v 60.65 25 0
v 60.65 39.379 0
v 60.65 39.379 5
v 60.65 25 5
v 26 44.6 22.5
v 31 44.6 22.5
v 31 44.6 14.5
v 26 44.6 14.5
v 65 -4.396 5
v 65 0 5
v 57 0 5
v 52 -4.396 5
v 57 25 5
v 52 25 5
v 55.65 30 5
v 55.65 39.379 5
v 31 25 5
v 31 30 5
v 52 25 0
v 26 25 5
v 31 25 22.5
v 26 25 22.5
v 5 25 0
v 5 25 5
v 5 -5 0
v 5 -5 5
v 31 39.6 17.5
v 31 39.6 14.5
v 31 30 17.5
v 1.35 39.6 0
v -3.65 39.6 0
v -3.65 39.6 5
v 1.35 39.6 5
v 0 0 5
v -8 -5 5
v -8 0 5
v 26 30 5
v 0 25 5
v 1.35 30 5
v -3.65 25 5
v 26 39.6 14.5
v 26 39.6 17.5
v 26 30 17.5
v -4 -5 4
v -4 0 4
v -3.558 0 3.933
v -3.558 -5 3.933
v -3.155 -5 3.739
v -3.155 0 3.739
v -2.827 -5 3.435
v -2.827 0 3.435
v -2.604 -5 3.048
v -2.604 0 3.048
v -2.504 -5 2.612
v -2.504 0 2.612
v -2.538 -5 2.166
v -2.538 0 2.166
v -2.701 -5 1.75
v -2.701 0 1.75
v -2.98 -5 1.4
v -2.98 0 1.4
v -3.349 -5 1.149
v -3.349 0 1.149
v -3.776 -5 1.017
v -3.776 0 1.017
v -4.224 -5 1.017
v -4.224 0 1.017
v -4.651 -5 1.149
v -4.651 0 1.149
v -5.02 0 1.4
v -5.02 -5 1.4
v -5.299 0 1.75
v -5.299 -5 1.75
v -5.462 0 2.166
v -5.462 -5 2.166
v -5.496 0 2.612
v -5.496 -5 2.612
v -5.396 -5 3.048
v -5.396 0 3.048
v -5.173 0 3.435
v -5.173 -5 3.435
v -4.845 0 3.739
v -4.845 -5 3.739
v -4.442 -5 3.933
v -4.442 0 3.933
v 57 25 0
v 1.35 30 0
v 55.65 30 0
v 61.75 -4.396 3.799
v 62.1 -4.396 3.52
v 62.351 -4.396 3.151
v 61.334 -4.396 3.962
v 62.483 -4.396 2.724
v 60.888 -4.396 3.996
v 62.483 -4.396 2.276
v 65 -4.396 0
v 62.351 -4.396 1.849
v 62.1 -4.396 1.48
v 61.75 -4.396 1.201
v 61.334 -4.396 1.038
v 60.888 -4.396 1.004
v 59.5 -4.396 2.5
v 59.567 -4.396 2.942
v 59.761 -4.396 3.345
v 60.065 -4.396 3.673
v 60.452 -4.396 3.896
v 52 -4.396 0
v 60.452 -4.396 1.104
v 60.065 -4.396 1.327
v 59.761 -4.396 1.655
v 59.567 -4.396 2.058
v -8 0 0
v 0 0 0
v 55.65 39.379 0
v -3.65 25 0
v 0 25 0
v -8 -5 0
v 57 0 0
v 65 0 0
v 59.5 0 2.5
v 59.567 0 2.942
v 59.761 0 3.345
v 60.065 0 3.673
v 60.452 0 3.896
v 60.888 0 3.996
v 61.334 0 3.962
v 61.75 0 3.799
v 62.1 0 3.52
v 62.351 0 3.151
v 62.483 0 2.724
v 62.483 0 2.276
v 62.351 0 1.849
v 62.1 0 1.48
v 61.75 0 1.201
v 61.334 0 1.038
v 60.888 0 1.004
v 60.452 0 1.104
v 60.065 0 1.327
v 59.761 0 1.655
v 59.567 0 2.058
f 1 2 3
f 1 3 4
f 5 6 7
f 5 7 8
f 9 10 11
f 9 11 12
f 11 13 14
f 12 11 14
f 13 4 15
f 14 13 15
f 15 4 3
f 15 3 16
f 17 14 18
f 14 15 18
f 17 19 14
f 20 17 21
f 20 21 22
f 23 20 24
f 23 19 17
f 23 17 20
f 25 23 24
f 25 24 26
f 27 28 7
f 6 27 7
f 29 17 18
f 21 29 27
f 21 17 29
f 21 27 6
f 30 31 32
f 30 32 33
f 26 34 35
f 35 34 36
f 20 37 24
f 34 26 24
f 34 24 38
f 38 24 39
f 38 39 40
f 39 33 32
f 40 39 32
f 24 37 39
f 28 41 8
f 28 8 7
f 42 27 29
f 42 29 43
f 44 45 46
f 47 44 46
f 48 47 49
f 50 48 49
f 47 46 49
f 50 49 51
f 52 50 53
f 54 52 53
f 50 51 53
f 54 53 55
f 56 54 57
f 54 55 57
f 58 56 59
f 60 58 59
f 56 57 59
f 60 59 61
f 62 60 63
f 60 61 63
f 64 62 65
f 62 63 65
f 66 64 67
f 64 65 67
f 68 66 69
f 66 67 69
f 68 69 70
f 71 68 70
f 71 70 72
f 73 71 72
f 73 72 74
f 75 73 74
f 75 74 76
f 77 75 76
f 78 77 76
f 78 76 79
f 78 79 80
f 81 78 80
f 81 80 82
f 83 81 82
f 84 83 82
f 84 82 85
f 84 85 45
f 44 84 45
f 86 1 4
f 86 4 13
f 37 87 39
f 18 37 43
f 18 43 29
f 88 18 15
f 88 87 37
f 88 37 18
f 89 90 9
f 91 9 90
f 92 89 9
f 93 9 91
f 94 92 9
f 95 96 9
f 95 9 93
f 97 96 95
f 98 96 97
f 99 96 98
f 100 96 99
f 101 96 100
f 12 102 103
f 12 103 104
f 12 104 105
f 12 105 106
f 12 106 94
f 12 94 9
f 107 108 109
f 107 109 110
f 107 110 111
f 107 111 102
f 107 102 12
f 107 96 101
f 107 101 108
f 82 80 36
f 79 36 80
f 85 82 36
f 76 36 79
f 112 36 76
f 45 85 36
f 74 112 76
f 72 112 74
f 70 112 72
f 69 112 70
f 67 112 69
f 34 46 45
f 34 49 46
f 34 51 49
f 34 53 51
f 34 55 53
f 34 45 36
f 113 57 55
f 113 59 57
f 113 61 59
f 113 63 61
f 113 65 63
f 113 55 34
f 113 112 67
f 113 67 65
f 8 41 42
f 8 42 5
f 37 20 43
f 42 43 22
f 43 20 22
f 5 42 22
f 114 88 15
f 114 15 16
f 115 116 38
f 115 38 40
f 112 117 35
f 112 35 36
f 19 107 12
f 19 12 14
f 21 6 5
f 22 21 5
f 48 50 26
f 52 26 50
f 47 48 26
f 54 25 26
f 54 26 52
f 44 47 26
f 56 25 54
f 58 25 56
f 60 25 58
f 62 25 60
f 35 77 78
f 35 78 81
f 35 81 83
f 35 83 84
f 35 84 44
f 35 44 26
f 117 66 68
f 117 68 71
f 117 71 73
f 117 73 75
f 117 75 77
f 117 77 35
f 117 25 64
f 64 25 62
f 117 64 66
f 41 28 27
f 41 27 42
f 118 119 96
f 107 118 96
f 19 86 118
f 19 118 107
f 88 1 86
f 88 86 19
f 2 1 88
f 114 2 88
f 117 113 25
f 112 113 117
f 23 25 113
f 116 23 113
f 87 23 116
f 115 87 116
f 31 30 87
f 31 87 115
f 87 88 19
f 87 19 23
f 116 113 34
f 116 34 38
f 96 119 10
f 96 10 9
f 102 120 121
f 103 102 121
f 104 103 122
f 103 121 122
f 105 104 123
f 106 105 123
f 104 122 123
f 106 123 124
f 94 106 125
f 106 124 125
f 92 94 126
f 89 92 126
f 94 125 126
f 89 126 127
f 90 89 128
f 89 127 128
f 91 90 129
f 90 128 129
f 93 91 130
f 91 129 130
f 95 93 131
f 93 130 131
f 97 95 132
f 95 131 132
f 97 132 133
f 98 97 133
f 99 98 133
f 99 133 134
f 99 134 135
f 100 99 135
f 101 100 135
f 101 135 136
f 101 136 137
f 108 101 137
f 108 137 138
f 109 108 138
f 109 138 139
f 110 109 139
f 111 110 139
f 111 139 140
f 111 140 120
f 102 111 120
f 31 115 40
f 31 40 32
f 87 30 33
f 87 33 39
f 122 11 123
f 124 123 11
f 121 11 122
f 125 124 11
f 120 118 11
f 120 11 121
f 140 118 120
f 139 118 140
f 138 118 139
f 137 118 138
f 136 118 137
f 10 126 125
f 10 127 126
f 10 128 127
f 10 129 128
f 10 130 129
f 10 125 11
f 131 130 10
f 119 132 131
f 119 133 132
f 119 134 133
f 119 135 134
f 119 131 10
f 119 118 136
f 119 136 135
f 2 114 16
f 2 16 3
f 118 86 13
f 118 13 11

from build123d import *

# Parameters (mm, degrees)
BOSS_EXTRUDE1_DEPTH = 5
SKETCH2_R           = 1.5
CUT_EXTRUDE1_DEPTH  = 41.708230126
SKETCH3_W           = 5
SKETCH3_H           = 5
BOSS_EXTRUDE2_DEPTH = 47
BOSS_EXTRUDE3_DEPTH = 5
SKETCH5_R           = 1.5
CUT_EXTRUDE2_DEPTH  = 77.27686412
BOSS_EXTRUDE4_DEPTH = 12.5
SKETCH10_W          = 5
SKETCH10_H          = 5
BOSS_EXTRUDE5_DEPTH = 14.6
BOSS_EXTRUDE6_DEPTH = 5


with BuildPart() as part:
    # Sketch1 → Boss-Extrude1 (new body)
    with BuildSketch(Plane.XY):
        Polygon((0, 0), (0, 25), (-3.65, 25), (-3.65, 39.6), (1.35, 39.6), (1.35, 30), (5, 30), (5, -5), (-8, -5), (-8, 0), align=None)
    extrude(amount=BOSS_EXTRUDE1_DEPTH)

    # Sketch2 → Cut-Extrude1 (cut, through all)
    with BuildSketch(Plane(origin=(0, 0, 0), x_dir=(1, 0, 0), z_dir=(0, 1, 0))):
        with Locations(Location((-4, -2.5, 0), (0, 0, 270))):
            Circle(SKETCH2_R)
    extrude(amount=-CUT_EXTRUDE1_DEPTH, mode=Mode.SUBTRACT)

    # Sketch3 → Boss-Extrude2 (add)
    with BuildSketch(Plane(origin=(5, 0, 0), x_dir=(0, 0, -1), z_dir=(1, 0, 0))):
        with Locations((-2.5, 27.5)):
            Rectangle(SKETCH3_W, SKETCH3_H)
    extrude(amount=BOSS_EXTRUDE2_DEPTH)

    # Sketch4 → Boss-Extrude3 (add)
    with BuildSketch(Plane(origin=(0, 0, 0), x_dir=(-1, 0, 0), z_dir=(0, 0, -1))):
        Polygon((-52, 30), (-55.65, 30), (-55.65, 39.379320009), (-60.65, 39.379320009), (-60.65, 25), (-57, 25), (-57, 0), (-65, 0), (-65, -4.395887534), (-52, -4.395887534), (-52, 25), align=None)
    extrude(amount=-BOSS_EXTRUDE3_DEPTH)

    # Sketch5 → Cut-Extrude2 (cut, through all)
    with BuildSketch(Plane(origin=(0, 0, 0), x_dir=(1, 0, 0), z_dir=(0, 1, 0))):
        with Locations(Location((61, -2.5, 0), (0, 0, 180))):
            Circle(SKETCH5_R)
    extrude(amount=-CUT_EXTRUDE2_DEPTH, mode=Mode.SUBTRACT)

    # Sketch7 → Boss-Extrude4 (add)
    with BuildSketch(Plane.XY.offset(5)):
        Polygon((28.5, 30), (31, 30), (31, 25), (26, 25), (26, 30), align=None)
    extrude(amount=BOSS_EXTRUDE4_DEPTH)

    # Sketch10 → Boss-Extrude5 (add)
    with BuildSketch(Plane(origin=(0, 25, 0), x_dir=(-1, 0, 0), z_dir=(0, -1, 0))):
        with Locations((-28.5, -20)):
            Rectangle(SKETCH10_W, SKETCH10_H)
    extrude(amount=-BOSS_EXTRUDE5_DEPTH)

    # Sketch11 → Boss-Extrude6 (add)
    with BuildSketch(Plane(origin=(0, 39.6, 0), x_dir=(1, 0, 0), z_dir=(0, 1, 0))):
        Polygon((26, -17.5), (26, -14.5), (31, -14.5), (31, -22.5), (26, -22.5), align=None)
    extrude(amount=BOSS_EXTRUDE6_DEPTH)


solid = part.part
